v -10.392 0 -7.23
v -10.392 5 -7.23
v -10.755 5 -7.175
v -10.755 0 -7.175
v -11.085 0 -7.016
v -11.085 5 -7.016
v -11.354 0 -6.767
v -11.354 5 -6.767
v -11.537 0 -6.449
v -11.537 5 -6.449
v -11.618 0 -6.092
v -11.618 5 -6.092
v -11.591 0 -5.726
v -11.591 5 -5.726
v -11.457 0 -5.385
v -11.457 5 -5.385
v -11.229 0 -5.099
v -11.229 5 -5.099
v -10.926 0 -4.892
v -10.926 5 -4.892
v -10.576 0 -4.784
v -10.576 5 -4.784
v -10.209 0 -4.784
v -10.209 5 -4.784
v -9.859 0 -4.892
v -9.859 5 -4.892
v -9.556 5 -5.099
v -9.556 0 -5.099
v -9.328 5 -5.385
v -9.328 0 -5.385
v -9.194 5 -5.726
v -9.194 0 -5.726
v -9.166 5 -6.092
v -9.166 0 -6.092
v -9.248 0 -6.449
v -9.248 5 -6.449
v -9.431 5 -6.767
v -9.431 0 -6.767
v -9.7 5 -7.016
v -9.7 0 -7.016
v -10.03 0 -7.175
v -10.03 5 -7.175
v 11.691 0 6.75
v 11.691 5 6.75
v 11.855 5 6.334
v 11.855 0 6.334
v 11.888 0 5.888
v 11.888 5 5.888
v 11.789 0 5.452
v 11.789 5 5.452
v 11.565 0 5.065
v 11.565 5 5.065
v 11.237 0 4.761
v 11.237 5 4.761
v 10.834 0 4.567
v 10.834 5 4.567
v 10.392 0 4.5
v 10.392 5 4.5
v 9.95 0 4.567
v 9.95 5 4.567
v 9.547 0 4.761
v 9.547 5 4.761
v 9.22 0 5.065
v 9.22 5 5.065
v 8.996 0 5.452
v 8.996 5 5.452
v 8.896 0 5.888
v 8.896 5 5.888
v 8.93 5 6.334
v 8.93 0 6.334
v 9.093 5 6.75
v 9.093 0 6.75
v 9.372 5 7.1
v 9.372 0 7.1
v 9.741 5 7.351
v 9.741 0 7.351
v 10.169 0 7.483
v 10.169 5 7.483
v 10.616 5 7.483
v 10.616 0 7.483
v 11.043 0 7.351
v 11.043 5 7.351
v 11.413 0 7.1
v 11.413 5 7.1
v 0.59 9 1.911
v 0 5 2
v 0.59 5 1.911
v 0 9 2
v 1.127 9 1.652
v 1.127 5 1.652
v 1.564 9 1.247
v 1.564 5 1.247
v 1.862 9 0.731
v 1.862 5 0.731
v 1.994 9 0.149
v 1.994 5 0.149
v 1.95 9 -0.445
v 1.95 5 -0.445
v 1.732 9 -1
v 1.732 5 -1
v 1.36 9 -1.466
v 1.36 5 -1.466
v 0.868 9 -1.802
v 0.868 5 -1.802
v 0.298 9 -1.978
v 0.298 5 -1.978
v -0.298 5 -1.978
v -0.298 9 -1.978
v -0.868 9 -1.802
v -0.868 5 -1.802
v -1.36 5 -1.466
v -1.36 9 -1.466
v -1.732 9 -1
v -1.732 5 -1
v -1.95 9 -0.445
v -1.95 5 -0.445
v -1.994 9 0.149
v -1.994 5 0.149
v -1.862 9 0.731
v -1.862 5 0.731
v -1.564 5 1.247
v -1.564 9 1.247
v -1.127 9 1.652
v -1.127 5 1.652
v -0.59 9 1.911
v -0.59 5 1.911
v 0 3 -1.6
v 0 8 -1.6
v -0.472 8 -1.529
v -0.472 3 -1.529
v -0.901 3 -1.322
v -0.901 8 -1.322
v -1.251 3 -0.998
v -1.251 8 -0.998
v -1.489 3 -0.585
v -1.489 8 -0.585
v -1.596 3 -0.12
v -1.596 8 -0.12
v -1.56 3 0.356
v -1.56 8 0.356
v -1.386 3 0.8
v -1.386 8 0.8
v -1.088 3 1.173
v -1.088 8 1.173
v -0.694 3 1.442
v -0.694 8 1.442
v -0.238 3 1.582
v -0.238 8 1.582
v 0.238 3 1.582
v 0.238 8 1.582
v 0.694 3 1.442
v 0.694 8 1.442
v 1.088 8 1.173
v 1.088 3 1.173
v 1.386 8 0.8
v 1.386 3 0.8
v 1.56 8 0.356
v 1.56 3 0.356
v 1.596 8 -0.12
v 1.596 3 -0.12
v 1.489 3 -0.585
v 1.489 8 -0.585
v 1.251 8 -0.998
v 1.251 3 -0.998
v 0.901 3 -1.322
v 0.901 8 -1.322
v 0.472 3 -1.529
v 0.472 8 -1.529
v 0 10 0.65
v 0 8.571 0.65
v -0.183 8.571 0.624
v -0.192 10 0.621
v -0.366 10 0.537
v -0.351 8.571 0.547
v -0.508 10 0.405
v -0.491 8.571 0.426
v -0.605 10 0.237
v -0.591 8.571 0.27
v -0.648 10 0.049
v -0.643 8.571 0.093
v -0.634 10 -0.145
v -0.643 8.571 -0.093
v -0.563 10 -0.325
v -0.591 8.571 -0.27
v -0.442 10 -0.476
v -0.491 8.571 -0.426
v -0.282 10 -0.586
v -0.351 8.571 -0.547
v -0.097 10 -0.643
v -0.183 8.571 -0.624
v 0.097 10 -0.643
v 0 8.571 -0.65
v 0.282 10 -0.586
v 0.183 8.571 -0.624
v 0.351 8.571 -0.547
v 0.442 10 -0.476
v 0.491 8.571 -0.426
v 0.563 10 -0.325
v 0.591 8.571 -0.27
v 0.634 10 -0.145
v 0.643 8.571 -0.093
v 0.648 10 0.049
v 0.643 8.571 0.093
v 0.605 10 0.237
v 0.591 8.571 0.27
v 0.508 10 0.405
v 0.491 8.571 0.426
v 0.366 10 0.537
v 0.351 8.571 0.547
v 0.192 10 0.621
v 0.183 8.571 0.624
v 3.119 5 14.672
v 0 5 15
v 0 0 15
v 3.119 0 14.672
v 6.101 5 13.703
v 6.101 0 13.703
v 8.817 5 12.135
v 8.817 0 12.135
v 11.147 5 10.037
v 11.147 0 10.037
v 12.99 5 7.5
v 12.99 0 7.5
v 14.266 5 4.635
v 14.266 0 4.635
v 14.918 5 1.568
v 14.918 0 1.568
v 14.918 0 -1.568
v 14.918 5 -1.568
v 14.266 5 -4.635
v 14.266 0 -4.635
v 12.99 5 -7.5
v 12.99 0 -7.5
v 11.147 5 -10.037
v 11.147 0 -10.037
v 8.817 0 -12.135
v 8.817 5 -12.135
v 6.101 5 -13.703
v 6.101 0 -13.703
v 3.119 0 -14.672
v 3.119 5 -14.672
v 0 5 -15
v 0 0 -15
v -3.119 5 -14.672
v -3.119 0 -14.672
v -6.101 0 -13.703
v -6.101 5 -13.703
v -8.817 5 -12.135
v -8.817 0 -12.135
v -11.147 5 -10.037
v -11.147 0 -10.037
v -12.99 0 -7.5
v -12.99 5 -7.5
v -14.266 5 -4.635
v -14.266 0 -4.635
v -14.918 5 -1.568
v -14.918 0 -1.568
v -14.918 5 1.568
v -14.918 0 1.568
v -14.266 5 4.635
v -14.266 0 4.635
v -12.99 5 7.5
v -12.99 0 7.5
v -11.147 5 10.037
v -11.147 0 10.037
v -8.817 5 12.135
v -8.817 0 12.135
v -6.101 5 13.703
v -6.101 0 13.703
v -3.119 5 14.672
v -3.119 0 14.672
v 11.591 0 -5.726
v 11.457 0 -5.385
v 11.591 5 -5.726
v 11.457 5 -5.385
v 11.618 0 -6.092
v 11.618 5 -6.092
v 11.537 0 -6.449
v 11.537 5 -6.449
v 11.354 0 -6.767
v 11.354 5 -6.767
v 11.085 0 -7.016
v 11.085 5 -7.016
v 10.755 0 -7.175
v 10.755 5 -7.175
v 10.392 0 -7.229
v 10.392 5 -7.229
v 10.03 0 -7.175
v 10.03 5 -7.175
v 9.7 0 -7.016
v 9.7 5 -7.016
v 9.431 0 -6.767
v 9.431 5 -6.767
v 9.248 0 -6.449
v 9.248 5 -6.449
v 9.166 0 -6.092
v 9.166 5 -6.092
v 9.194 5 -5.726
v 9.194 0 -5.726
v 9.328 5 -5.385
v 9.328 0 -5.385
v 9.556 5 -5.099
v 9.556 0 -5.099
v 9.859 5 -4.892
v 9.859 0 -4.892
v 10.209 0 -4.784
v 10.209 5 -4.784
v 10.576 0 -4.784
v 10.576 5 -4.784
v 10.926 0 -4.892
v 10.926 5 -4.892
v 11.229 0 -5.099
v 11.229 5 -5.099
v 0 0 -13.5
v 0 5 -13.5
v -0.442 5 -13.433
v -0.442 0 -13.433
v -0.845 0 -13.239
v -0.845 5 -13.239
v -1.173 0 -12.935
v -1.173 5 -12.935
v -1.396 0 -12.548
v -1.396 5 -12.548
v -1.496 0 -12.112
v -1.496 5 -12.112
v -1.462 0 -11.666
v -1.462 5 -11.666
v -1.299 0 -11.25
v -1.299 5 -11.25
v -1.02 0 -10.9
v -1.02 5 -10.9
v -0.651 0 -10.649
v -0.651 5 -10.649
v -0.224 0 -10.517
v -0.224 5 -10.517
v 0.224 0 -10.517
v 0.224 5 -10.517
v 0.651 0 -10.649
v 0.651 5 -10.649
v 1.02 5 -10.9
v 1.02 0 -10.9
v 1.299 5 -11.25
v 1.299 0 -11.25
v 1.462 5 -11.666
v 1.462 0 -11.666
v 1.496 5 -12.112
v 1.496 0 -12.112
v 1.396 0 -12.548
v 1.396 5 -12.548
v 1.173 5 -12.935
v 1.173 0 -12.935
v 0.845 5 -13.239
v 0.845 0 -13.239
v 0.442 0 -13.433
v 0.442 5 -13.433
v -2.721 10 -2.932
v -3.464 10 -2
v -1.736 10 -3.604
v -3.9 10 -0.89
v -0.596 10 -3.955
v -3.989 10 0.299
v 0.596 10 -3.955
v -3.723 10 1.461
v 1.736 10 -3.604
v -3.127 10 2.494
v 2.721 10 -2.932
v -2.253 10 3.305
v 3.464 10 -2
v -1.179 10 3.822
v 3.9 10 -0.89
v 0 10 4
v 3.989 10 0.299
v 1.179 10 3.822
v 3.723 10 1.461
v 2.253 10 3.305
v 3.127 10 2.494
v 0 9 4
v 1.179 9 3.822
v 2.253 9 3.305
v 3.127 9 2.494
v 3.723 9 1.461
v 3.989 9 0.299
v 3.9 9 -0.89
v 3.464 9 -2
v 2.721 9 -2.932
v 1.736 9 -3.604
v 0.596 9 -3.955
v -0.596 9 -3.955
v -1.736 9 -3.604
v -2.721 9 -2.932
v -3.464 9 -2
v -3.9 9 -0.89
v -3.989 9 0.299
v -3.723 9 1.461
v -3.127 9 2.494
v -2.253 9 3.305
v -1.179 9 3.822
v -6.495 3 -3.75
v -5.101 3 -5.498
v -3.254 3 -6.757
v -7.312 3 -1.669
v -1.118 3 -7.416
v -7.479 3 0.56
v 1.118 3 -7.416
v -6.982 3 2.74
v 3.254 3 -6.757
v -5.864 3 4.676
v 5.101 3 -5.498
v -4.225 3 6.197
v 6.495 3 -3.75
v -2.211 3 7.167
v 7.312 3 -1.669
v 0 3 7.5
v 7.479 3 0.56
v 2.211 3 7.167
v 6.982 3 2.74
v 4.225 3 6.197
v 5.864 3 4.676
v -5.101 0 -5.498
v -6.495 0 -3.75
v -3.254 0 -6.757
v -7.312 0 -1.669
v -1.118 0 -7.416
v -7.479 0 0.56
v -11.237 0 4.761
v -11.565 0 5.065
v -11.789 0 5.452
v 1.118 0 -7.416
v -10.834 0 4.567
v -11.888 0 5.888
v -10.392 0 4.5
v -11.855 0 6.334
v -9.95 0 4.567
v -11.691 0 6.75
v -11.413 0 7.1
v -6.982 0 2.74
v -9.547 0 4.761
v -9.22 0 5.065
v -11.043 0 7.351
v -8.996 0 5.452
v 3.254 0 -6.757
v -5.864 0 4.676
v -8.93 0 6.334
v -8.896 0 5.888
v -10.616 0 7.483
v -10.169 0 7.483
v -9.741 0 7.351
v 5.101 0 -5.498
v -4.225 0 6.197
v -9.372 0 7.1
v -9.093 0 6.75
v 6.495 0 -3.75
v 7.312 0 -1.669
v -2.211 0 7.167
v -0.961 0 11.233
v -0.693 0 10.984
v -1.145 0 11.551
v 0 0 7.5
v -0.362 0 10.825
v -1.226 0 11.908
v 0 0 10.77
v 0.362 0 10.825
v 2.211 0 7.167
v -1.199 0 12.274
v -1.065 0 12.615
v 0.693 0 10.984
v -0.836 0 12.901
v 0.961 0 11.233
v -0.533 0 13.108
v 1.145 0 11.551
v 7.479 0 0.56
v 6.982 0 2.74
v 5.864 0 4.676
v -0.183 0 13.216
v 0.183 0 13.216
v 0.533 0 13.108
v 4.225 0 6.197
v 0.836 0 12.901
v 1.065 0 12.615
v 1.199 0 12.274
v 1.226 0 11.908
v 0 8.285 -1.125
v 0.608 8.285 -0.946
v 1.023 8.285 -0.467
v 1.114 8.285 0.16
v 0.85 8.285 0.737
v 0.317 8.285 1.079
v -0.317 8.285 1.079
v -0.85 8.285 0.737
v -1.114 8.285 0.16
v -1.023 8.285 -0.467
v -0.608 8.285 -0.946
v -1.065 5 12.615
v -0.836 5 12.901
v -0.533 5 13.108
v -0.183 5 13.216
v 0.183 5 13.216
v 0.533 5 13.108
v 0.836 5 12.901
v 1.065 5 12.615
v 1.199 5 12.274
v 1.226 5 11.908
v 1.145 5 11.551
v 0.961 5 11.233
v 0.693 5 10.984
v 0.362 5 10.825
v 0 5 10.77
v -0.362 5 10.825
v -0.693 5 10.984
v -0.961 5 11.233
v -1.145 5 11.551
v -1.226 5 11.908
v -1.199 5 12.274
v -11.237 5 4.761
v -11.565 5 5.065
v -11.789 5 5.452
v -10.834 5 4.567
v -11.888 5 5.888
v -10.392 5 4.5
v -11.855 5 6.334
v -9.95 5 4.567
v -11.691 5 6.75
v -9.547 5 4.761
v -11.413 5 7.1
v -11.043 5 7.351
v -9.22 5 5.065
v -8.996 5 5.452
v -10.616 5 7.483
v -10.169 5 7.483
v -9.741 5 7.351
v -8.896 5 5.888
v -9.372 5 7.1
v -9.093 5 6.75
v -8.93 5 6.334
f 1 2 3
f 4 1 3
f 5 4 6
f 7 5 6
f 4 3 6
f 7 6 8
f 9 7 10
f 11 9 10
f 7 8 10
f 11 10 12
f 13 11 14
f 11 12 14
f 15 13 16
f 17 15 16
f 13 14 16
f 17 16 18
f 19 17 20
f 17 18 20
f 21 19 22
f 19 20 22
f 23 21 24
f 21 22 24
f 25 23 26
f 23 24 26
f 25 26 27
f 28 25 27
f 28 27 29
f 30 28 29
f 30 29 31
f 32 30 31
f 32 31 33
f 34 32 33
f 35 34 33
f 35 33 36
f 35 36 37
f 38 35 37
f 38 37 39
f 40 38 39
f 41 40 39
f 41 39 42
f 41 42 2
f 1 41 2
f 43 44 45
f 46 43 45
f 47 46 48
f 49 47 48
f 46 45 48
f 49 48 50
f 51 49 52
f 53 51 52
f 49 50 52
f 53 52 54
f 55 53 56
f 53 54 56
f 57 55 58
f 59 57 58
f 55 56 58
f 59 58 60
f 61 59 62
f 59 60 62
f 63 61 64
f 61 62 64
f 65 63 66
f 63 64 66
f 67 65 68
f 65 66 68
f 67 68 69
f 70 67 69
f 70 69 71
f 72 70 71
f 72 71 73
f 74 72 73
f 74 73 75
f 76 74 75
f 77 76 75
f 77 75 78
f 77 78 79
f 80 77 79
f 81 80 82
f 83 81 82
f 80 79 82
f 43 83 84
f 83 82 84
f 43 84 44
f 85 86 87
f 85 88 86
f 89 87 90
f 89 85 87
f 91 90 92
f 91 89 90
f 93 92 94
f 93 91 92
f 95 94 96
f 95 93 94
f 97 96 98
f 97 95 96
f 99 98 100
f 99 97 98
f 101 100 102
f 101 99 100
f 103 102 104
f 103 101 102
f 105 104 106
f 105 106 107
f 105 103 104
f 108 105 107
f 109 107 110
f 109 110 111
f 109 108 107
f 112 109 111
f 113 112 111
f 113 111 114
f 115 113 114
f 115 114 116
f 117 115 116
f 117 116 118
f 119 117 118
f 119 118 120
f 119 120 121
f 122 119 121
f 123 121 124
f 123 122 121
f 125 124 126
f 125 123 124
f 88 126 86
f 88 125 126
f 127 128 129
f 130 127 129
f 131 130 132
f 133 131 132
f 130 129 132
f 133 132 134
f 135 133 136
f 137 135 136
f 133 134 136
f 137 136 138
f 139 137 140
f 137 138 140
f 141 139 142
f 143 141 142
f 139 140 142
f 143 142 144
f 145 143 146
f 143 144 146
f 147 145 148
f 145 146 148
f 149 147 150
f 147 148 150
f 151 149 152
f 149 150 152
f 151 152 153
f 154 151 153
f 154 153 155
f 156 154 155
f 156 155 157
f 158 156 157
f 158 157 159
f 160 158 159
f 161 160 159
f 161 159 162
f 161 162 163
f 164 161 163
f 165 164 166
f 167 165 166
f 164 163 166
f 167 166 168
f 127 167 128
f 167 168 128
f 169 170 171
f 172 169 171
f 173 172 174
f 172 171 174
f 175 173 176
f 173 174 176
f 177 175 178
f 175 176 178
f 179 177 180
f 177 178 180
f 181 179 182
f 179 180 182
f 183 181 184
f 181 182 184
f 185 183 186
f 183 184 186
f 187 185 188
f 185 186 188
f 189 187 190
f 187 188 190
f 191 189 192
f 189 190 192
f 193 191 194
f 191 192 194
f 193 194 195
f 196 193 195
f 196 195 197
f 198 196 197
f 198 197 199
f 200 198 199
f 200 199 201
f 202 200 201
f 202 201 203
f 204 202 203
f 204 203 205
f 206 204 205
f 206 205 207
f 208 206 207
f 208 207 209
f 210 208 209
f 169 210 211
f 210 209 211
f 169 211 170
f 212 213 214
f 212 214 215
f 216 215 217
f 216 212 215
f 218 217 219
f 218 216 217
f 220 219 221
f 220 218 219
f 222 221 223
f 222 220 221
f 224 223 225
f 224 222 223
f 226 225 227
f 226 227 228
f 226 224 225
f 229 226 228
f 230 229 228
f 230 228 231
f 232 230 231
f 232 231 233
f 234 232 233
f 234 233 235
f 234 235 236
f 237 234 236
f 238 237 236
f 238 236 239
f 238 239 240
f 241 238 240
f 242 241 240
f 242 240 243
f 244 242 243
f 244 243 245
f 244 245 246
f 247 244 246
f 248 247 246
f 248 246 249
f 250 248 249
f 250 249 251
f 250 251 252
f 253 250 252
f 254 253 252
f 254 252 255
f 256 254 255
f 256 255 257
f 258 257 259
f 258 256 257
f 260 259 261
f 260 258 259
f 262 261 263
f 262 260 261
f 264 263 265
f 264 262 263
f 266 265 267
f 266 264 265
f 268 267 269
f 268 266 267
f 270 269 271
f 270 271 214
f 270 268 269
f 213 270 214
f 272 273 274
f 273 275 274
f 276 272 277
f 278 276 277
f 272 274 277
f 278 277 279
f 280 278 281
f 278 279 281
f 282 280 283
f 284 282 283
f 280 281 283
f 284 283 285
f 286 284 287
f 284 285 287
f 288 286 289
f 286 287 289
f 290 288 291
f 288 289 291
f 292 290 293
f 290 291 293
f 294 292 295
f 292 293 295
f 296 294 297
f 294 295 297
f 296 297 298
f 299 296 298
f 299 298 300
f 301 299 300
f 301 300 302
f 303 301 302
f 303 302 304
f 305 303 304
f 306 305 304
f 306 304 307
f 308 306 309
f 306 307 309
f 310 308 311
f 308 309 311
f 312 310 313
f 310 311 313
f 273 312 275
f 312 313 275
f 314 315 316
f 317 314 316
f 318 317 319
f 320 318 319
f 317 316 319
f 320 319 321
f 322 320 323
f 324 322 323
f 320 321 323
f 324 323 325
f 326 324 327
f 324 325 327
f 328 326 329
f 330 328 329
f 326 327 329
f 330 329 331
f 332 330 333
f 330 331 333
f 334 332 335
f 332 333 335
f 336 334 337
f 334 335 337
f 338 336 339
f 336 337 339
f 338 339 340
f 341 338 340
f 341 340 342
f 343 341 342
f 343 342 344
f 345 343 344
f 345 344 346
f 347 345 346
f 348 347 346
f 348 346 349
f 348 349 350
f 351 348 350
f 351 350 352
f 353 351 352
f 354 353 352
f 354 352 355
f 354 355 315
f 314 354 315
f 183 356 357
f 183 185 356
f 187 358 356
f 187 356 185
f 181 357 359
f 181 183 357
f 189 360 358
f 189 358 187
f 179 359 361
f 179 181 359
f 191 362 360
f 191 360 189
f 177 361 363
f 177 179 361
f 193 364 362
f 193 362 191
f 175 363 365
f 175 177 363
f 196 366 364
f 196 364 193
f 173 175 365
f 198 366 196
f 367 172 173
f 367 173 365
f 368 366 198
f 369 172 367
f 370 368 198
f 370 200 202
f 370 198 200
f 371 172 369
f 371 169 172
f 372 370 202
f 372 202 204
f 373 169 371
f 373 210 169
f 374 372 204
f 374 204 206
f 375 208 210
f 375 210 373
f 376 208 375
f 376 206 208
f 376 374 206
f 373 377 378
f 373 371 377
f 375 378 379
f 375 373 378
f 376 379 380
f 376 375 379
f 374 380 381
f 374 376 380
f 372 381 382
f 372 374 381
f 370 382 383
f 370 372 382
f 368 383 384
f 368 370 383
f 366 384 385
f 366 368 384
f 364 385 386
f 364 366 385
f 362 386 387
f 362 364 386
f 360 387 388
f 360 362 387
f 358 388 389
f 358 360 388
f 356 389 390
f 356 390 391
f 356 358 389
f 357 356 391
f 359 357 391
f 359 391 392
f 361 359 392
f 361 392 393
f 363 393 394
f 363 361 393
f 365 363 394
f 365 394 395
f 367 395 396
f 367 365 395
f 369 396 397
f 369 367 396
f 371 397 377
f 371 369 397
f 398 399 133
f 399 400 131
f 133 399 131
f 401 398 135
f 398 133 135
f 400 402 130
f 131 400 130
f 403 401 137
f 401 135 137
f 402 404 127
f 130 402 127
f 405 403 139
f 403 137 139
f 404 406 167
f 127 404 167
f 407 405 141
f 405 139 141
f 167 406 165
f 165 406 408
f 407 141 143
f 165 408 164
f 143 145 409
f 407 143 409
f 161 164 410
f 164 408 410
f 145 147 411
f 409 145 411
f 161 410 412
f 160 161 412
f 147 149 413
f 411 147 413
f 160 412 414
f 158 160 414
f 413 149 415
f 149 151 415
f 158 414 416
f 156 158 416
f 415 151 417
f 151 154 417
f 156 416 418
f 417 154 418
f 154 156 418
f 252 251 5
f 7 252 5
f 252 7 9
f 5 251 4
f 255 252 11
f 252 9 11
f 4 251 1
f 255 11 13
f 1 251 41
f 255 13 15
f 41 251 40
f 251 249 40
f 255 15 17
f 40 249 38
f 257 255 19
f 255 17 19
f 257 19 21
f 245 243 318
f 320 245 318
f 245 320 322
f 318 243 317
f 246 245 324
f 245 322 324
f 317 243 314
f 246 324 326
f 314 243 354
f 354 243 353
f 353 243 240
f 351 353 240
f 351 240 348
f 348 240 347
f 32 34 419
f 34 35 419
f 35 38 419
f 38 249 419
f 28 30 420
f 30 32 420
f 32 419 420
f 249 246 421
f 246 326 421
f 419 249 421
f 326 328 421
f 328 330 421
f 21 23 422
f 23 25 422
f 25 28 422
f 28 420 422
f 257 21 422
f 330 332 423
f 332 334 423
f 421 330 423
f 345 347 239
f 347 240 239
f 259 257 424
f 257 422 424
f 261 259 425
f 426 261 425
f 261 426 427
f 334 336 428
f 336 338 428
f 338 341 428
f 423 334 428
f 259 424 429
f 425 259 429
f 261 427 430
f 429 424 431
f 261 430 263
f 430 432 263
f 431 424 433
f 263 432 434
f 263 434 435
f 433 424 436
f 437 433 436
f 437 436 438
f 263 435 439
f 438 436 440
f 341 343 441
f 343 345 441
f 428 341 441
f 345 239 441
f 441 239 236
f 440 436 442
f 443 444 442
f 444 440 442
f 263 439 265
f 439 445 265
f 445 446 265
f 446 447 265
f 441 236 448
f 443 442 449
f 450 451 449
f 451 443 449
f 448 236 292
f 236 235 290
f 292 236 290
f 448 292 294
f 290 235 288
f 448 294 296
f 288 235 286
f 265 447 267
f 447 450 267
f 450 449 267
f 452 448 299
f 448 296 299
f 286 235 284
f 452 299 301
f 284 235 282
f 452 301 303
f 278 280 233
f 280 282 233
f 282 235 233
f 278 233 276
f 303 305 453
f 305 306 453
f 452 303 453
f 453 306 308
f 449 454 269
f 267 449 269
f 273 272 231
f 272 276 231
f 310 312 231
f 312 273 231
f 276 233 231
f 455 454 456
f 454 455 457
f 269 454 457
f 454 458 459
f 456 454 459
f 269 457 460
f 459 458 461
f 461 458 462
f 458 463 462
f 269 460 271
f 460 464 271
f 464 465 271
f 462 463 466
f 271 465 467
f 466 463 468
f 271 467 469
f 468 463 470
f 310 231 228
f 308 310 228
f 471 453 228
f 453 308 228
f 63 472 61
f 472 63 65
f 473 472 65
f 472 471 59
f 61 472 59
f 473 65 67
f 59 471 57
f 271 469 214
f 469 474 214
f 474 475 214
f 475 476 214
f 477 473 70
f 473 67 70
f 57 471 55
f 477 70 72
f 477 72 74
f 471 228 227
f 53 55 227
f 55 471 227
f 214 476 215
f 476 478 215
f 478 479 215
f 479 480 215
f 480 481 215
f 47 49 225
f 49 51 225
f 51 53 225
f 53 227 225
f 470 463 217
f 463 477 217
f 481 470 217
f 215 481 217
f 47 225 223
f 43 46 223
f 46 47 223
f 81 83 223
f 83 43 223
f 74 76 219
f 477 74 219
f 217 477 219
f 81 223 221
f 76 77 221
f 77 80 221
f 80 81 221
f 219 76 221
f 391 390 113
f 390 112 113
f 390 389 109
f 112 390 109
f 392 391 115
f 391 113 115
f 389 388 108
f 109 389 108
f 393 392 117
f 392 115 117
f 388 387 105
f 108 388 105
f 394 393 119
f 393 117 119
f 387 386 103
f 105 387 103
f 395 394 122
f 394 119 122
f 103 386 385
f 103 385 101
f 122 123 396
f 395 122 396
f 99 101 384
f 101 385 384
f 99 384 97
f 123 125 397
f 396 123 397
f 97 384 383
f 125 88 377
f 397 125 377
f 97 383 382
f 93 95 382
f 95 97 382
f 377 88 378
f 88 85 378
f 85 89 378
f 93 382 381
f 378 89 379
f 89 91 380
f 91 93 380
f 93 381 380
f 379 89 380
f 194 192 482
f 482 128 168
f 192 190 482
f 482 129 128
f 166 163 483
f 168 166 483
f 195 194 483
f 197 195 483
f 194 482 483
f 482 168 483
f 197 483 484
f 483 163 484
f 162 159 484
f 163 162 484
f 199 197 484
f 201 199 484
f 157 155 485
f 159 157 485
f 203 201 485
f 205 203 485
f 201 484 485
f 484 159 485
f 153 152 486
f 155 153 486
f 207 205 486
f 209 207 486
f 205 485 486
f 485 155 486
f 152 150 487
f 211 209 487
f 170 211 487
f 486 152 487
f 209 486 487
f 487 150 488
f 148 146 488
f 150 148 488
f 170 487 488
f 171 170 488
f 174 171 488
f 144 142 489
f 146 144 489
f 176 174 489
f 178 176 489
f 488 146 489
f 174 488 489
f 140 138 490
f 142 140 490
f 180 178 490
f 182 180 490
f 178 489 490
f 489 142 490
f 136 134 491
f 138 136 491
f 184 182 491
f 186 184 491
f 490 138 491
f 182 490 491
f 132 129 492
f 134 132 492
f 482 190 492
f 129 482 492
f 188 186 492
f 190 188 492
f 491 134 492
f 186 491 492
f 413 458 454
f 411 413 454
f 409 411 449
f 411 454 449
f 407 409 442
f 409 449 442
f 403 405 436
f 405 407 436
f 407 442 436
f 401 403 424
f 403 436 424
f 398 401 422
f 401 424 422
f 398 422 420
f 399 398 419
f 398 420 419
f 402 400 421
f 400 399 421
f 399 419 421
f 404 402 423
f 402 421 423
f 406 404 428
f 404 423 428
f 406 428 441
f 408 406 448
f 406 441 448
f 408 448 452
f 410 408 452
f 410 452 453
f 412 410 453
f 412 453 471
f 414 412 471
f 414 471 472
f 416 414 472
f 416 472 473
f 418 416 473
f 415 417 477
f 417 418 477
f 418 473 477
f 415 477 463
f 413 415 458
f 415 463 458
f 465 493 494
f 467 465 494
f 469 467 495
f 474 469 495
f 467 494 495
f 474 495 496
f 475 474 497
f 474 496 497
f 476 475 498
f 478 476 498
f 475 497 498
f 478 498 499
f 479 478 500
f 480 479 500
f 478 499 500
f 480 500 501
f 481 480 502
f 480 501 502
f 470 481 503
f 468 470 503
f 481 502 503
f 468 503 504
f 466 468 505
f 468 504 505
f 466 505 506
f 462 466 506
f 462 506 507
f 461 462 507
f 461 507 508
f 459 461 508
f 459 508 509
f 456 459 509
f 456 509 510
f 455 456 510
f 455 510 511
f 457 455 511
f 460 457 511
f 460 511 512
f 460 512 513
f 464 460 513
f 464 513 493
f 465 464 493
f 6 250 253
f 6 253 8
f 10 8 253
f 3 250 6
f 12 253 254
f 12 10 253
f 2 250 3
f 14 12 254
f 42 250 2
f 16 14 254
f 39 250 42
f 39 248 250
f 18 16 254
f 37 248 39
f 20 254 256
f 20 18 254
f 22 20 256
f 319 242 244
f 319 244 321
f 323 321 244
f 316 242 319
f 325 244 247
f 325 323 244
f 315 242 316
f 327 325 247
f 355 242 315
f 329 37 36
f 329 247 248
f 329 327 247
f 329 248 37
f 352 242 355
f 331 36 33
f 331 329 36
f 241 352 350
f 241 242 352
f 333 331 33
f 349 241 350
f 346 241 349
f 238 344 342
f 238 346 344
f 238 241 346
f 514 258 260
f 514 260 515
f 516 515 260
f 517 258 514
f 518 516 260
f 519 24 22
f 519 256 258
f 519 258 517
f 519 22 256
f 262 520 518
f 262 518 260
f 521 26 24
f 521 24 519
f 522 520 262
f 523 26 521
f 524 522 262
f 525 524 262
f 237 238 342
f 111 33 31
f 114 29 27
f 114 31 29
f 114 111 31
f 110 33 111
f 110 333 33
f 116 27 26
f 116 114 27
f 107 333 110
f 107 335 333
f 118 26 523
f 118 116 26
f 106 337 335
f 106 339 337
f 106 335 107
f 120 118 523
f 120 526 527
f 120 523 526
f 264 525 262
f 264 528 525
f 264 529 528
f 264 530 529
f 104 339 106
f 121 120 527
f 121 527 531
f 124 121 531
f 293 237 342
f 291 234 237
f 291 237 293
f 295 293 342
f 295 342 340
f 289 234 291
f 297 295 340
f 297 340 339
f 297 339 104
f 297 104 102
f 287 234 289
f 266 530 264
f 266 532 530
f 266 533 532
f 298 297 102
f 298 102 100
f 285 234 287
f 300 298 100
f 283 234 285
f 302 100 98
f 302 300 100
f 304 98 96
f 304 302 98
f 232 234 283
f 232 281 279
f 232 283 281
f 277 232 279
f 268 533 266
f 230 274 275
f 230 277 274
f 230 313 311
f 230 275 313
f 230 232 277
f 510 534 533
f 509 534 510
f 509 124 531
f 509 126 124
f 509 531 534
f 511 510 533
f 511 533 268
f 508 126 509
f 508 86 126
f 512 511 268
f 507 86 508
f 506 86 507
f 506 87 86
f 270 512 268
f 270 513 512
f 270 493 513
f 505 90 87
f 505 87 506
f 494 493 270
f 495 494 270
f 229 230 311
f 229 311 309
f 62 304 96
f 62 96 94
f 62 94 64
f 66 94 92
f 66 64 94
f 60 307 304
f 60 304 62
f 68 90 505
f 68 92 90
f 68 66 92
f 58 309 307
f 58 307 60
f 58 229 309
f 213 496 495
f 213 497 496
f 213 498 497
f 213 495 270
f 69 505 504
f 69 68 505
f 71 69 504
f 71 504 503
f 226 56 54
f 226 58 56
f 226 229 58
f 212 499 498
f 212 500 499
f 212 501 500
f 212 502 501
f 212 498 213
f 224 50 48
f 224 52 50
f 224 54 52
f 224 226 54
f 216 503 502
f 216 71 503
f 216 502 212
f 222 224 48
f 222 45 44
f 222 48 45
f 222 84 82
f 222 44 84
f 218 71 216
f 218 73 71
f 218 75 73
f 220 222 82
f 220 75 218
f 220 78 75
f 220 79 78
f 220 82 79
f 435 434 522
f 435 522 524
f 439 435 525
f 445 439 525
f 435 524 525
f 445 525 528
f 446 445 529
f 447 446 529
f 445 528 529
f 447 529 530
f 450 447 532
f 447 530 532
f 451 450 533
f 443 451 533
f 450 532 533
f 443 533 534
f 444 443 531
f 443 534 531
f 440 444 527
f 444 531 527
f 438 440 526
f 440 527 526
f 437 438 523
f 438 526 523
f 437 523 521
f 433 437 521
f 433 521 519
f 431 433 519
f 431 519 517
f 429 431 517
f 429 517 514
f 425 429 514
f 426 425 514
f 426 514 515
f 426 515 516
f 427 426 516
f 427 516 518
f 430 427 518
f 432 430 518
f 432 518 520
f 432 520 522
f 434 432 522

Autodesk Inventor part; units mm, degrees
ref_plane "YZ Plane" through (0, 0, 0) normal (1, 0, 0) x (0, 1, 0)
ref_plane "XZ Plane" through (0, 0, 0) normal (0, 1, 0) x (-1, 0, 0)
ref_plane "XY Plane" through (0, 0, 0) normal (0, 0, 1) x (1, 0, 0)
sketch "Sketch1" plane through (0, 0, 0) normal (1, 0, 0) x (0, 1, 0)
  line L0 (0, 7.5) -> (0, 15)
  line L1 (0, 15) -> (5, 15)
  line L2 (5, 15) -> (5, 2)
  line L3 (5, 2) -> (9, 2)
  line L4 (9, 2) -> (9, 4)
  line L5 (9, 4) -> (10, 4)
  line L6 (10, 4) -> (10, 0.65)
  line L7 (10, 0.65) -> (3, 0.65)
  line L8 (3, 0.65) -> (3, 7.5)
  line L9 (3, 7.5) -> (0, 7.5)
  line L10 (-2, 0) -> (12, 0) projected
  point P0 (0, 0)
  dimension "d0" = 7.5
  dimension "d1" = 0.65
  dimension "d2" = 4
  dimension "d3" = 2
  dimension "d4" = 15
  dimension "d5" = 5
  dimension "d6" = 4
  dimension "d7" = 1
  dimension "d34" = 3
revolve "Revolution1" add sketch "Sketch1" angle 360 about axis through (0, -10, 0) along (0, 1, 0)
sketch "Sketch2" plane through (0, 0, 0) normal (0, -1, 0) x (1, 0, 0)
  point P0 (0, 0)
  point P1 (0, -12)
  dimension "d10" = 12
hole "Hole1" at (0, 0, -12) direction (0, 1, 0) diameter 3 end through all
pattern_circular "Circular Pattern1" count 3 over 360 about axis through (0, 2.5, 0) along (0, 1, 0) of "Hole1"
sketch "Sketch3" plane through (0, 0, 0) normal (0, -1, 0) x (1, 0, 0)
  circle A0 centre (0, 0) radius 12 construction
  circle A1 centre (0, -12) radius 1.5 projected
  point P0 (-10.3923, -6)
  dimension "d21" = 24
  dimension "d22" = 60
hole "Hole2" at (-10.3923, 0, -6) direction (0, 1, 0) diameter 2.459 end through all thread size "M3x0.5" class "6H" standard "ANSI Metric M Profile"
pattern_circular "Circular Pattern2" count 3 over 360 about axis through (0, 2.5, 0) along (0, 1, 0) of "Hole2"
sketch "Sketch4" plane through (0, 3, 0) normal (0, -1, 0) x (1, 0, 0)
  point P0 (0, 0)
  point P1 (0, 0)
hole "Hole3" at (0, 3, 0) direction (0, 1, 0) diameter 3.2 depth 5 tip angle 118
properties part number "RodHolder-2023-1" material "Copper"
